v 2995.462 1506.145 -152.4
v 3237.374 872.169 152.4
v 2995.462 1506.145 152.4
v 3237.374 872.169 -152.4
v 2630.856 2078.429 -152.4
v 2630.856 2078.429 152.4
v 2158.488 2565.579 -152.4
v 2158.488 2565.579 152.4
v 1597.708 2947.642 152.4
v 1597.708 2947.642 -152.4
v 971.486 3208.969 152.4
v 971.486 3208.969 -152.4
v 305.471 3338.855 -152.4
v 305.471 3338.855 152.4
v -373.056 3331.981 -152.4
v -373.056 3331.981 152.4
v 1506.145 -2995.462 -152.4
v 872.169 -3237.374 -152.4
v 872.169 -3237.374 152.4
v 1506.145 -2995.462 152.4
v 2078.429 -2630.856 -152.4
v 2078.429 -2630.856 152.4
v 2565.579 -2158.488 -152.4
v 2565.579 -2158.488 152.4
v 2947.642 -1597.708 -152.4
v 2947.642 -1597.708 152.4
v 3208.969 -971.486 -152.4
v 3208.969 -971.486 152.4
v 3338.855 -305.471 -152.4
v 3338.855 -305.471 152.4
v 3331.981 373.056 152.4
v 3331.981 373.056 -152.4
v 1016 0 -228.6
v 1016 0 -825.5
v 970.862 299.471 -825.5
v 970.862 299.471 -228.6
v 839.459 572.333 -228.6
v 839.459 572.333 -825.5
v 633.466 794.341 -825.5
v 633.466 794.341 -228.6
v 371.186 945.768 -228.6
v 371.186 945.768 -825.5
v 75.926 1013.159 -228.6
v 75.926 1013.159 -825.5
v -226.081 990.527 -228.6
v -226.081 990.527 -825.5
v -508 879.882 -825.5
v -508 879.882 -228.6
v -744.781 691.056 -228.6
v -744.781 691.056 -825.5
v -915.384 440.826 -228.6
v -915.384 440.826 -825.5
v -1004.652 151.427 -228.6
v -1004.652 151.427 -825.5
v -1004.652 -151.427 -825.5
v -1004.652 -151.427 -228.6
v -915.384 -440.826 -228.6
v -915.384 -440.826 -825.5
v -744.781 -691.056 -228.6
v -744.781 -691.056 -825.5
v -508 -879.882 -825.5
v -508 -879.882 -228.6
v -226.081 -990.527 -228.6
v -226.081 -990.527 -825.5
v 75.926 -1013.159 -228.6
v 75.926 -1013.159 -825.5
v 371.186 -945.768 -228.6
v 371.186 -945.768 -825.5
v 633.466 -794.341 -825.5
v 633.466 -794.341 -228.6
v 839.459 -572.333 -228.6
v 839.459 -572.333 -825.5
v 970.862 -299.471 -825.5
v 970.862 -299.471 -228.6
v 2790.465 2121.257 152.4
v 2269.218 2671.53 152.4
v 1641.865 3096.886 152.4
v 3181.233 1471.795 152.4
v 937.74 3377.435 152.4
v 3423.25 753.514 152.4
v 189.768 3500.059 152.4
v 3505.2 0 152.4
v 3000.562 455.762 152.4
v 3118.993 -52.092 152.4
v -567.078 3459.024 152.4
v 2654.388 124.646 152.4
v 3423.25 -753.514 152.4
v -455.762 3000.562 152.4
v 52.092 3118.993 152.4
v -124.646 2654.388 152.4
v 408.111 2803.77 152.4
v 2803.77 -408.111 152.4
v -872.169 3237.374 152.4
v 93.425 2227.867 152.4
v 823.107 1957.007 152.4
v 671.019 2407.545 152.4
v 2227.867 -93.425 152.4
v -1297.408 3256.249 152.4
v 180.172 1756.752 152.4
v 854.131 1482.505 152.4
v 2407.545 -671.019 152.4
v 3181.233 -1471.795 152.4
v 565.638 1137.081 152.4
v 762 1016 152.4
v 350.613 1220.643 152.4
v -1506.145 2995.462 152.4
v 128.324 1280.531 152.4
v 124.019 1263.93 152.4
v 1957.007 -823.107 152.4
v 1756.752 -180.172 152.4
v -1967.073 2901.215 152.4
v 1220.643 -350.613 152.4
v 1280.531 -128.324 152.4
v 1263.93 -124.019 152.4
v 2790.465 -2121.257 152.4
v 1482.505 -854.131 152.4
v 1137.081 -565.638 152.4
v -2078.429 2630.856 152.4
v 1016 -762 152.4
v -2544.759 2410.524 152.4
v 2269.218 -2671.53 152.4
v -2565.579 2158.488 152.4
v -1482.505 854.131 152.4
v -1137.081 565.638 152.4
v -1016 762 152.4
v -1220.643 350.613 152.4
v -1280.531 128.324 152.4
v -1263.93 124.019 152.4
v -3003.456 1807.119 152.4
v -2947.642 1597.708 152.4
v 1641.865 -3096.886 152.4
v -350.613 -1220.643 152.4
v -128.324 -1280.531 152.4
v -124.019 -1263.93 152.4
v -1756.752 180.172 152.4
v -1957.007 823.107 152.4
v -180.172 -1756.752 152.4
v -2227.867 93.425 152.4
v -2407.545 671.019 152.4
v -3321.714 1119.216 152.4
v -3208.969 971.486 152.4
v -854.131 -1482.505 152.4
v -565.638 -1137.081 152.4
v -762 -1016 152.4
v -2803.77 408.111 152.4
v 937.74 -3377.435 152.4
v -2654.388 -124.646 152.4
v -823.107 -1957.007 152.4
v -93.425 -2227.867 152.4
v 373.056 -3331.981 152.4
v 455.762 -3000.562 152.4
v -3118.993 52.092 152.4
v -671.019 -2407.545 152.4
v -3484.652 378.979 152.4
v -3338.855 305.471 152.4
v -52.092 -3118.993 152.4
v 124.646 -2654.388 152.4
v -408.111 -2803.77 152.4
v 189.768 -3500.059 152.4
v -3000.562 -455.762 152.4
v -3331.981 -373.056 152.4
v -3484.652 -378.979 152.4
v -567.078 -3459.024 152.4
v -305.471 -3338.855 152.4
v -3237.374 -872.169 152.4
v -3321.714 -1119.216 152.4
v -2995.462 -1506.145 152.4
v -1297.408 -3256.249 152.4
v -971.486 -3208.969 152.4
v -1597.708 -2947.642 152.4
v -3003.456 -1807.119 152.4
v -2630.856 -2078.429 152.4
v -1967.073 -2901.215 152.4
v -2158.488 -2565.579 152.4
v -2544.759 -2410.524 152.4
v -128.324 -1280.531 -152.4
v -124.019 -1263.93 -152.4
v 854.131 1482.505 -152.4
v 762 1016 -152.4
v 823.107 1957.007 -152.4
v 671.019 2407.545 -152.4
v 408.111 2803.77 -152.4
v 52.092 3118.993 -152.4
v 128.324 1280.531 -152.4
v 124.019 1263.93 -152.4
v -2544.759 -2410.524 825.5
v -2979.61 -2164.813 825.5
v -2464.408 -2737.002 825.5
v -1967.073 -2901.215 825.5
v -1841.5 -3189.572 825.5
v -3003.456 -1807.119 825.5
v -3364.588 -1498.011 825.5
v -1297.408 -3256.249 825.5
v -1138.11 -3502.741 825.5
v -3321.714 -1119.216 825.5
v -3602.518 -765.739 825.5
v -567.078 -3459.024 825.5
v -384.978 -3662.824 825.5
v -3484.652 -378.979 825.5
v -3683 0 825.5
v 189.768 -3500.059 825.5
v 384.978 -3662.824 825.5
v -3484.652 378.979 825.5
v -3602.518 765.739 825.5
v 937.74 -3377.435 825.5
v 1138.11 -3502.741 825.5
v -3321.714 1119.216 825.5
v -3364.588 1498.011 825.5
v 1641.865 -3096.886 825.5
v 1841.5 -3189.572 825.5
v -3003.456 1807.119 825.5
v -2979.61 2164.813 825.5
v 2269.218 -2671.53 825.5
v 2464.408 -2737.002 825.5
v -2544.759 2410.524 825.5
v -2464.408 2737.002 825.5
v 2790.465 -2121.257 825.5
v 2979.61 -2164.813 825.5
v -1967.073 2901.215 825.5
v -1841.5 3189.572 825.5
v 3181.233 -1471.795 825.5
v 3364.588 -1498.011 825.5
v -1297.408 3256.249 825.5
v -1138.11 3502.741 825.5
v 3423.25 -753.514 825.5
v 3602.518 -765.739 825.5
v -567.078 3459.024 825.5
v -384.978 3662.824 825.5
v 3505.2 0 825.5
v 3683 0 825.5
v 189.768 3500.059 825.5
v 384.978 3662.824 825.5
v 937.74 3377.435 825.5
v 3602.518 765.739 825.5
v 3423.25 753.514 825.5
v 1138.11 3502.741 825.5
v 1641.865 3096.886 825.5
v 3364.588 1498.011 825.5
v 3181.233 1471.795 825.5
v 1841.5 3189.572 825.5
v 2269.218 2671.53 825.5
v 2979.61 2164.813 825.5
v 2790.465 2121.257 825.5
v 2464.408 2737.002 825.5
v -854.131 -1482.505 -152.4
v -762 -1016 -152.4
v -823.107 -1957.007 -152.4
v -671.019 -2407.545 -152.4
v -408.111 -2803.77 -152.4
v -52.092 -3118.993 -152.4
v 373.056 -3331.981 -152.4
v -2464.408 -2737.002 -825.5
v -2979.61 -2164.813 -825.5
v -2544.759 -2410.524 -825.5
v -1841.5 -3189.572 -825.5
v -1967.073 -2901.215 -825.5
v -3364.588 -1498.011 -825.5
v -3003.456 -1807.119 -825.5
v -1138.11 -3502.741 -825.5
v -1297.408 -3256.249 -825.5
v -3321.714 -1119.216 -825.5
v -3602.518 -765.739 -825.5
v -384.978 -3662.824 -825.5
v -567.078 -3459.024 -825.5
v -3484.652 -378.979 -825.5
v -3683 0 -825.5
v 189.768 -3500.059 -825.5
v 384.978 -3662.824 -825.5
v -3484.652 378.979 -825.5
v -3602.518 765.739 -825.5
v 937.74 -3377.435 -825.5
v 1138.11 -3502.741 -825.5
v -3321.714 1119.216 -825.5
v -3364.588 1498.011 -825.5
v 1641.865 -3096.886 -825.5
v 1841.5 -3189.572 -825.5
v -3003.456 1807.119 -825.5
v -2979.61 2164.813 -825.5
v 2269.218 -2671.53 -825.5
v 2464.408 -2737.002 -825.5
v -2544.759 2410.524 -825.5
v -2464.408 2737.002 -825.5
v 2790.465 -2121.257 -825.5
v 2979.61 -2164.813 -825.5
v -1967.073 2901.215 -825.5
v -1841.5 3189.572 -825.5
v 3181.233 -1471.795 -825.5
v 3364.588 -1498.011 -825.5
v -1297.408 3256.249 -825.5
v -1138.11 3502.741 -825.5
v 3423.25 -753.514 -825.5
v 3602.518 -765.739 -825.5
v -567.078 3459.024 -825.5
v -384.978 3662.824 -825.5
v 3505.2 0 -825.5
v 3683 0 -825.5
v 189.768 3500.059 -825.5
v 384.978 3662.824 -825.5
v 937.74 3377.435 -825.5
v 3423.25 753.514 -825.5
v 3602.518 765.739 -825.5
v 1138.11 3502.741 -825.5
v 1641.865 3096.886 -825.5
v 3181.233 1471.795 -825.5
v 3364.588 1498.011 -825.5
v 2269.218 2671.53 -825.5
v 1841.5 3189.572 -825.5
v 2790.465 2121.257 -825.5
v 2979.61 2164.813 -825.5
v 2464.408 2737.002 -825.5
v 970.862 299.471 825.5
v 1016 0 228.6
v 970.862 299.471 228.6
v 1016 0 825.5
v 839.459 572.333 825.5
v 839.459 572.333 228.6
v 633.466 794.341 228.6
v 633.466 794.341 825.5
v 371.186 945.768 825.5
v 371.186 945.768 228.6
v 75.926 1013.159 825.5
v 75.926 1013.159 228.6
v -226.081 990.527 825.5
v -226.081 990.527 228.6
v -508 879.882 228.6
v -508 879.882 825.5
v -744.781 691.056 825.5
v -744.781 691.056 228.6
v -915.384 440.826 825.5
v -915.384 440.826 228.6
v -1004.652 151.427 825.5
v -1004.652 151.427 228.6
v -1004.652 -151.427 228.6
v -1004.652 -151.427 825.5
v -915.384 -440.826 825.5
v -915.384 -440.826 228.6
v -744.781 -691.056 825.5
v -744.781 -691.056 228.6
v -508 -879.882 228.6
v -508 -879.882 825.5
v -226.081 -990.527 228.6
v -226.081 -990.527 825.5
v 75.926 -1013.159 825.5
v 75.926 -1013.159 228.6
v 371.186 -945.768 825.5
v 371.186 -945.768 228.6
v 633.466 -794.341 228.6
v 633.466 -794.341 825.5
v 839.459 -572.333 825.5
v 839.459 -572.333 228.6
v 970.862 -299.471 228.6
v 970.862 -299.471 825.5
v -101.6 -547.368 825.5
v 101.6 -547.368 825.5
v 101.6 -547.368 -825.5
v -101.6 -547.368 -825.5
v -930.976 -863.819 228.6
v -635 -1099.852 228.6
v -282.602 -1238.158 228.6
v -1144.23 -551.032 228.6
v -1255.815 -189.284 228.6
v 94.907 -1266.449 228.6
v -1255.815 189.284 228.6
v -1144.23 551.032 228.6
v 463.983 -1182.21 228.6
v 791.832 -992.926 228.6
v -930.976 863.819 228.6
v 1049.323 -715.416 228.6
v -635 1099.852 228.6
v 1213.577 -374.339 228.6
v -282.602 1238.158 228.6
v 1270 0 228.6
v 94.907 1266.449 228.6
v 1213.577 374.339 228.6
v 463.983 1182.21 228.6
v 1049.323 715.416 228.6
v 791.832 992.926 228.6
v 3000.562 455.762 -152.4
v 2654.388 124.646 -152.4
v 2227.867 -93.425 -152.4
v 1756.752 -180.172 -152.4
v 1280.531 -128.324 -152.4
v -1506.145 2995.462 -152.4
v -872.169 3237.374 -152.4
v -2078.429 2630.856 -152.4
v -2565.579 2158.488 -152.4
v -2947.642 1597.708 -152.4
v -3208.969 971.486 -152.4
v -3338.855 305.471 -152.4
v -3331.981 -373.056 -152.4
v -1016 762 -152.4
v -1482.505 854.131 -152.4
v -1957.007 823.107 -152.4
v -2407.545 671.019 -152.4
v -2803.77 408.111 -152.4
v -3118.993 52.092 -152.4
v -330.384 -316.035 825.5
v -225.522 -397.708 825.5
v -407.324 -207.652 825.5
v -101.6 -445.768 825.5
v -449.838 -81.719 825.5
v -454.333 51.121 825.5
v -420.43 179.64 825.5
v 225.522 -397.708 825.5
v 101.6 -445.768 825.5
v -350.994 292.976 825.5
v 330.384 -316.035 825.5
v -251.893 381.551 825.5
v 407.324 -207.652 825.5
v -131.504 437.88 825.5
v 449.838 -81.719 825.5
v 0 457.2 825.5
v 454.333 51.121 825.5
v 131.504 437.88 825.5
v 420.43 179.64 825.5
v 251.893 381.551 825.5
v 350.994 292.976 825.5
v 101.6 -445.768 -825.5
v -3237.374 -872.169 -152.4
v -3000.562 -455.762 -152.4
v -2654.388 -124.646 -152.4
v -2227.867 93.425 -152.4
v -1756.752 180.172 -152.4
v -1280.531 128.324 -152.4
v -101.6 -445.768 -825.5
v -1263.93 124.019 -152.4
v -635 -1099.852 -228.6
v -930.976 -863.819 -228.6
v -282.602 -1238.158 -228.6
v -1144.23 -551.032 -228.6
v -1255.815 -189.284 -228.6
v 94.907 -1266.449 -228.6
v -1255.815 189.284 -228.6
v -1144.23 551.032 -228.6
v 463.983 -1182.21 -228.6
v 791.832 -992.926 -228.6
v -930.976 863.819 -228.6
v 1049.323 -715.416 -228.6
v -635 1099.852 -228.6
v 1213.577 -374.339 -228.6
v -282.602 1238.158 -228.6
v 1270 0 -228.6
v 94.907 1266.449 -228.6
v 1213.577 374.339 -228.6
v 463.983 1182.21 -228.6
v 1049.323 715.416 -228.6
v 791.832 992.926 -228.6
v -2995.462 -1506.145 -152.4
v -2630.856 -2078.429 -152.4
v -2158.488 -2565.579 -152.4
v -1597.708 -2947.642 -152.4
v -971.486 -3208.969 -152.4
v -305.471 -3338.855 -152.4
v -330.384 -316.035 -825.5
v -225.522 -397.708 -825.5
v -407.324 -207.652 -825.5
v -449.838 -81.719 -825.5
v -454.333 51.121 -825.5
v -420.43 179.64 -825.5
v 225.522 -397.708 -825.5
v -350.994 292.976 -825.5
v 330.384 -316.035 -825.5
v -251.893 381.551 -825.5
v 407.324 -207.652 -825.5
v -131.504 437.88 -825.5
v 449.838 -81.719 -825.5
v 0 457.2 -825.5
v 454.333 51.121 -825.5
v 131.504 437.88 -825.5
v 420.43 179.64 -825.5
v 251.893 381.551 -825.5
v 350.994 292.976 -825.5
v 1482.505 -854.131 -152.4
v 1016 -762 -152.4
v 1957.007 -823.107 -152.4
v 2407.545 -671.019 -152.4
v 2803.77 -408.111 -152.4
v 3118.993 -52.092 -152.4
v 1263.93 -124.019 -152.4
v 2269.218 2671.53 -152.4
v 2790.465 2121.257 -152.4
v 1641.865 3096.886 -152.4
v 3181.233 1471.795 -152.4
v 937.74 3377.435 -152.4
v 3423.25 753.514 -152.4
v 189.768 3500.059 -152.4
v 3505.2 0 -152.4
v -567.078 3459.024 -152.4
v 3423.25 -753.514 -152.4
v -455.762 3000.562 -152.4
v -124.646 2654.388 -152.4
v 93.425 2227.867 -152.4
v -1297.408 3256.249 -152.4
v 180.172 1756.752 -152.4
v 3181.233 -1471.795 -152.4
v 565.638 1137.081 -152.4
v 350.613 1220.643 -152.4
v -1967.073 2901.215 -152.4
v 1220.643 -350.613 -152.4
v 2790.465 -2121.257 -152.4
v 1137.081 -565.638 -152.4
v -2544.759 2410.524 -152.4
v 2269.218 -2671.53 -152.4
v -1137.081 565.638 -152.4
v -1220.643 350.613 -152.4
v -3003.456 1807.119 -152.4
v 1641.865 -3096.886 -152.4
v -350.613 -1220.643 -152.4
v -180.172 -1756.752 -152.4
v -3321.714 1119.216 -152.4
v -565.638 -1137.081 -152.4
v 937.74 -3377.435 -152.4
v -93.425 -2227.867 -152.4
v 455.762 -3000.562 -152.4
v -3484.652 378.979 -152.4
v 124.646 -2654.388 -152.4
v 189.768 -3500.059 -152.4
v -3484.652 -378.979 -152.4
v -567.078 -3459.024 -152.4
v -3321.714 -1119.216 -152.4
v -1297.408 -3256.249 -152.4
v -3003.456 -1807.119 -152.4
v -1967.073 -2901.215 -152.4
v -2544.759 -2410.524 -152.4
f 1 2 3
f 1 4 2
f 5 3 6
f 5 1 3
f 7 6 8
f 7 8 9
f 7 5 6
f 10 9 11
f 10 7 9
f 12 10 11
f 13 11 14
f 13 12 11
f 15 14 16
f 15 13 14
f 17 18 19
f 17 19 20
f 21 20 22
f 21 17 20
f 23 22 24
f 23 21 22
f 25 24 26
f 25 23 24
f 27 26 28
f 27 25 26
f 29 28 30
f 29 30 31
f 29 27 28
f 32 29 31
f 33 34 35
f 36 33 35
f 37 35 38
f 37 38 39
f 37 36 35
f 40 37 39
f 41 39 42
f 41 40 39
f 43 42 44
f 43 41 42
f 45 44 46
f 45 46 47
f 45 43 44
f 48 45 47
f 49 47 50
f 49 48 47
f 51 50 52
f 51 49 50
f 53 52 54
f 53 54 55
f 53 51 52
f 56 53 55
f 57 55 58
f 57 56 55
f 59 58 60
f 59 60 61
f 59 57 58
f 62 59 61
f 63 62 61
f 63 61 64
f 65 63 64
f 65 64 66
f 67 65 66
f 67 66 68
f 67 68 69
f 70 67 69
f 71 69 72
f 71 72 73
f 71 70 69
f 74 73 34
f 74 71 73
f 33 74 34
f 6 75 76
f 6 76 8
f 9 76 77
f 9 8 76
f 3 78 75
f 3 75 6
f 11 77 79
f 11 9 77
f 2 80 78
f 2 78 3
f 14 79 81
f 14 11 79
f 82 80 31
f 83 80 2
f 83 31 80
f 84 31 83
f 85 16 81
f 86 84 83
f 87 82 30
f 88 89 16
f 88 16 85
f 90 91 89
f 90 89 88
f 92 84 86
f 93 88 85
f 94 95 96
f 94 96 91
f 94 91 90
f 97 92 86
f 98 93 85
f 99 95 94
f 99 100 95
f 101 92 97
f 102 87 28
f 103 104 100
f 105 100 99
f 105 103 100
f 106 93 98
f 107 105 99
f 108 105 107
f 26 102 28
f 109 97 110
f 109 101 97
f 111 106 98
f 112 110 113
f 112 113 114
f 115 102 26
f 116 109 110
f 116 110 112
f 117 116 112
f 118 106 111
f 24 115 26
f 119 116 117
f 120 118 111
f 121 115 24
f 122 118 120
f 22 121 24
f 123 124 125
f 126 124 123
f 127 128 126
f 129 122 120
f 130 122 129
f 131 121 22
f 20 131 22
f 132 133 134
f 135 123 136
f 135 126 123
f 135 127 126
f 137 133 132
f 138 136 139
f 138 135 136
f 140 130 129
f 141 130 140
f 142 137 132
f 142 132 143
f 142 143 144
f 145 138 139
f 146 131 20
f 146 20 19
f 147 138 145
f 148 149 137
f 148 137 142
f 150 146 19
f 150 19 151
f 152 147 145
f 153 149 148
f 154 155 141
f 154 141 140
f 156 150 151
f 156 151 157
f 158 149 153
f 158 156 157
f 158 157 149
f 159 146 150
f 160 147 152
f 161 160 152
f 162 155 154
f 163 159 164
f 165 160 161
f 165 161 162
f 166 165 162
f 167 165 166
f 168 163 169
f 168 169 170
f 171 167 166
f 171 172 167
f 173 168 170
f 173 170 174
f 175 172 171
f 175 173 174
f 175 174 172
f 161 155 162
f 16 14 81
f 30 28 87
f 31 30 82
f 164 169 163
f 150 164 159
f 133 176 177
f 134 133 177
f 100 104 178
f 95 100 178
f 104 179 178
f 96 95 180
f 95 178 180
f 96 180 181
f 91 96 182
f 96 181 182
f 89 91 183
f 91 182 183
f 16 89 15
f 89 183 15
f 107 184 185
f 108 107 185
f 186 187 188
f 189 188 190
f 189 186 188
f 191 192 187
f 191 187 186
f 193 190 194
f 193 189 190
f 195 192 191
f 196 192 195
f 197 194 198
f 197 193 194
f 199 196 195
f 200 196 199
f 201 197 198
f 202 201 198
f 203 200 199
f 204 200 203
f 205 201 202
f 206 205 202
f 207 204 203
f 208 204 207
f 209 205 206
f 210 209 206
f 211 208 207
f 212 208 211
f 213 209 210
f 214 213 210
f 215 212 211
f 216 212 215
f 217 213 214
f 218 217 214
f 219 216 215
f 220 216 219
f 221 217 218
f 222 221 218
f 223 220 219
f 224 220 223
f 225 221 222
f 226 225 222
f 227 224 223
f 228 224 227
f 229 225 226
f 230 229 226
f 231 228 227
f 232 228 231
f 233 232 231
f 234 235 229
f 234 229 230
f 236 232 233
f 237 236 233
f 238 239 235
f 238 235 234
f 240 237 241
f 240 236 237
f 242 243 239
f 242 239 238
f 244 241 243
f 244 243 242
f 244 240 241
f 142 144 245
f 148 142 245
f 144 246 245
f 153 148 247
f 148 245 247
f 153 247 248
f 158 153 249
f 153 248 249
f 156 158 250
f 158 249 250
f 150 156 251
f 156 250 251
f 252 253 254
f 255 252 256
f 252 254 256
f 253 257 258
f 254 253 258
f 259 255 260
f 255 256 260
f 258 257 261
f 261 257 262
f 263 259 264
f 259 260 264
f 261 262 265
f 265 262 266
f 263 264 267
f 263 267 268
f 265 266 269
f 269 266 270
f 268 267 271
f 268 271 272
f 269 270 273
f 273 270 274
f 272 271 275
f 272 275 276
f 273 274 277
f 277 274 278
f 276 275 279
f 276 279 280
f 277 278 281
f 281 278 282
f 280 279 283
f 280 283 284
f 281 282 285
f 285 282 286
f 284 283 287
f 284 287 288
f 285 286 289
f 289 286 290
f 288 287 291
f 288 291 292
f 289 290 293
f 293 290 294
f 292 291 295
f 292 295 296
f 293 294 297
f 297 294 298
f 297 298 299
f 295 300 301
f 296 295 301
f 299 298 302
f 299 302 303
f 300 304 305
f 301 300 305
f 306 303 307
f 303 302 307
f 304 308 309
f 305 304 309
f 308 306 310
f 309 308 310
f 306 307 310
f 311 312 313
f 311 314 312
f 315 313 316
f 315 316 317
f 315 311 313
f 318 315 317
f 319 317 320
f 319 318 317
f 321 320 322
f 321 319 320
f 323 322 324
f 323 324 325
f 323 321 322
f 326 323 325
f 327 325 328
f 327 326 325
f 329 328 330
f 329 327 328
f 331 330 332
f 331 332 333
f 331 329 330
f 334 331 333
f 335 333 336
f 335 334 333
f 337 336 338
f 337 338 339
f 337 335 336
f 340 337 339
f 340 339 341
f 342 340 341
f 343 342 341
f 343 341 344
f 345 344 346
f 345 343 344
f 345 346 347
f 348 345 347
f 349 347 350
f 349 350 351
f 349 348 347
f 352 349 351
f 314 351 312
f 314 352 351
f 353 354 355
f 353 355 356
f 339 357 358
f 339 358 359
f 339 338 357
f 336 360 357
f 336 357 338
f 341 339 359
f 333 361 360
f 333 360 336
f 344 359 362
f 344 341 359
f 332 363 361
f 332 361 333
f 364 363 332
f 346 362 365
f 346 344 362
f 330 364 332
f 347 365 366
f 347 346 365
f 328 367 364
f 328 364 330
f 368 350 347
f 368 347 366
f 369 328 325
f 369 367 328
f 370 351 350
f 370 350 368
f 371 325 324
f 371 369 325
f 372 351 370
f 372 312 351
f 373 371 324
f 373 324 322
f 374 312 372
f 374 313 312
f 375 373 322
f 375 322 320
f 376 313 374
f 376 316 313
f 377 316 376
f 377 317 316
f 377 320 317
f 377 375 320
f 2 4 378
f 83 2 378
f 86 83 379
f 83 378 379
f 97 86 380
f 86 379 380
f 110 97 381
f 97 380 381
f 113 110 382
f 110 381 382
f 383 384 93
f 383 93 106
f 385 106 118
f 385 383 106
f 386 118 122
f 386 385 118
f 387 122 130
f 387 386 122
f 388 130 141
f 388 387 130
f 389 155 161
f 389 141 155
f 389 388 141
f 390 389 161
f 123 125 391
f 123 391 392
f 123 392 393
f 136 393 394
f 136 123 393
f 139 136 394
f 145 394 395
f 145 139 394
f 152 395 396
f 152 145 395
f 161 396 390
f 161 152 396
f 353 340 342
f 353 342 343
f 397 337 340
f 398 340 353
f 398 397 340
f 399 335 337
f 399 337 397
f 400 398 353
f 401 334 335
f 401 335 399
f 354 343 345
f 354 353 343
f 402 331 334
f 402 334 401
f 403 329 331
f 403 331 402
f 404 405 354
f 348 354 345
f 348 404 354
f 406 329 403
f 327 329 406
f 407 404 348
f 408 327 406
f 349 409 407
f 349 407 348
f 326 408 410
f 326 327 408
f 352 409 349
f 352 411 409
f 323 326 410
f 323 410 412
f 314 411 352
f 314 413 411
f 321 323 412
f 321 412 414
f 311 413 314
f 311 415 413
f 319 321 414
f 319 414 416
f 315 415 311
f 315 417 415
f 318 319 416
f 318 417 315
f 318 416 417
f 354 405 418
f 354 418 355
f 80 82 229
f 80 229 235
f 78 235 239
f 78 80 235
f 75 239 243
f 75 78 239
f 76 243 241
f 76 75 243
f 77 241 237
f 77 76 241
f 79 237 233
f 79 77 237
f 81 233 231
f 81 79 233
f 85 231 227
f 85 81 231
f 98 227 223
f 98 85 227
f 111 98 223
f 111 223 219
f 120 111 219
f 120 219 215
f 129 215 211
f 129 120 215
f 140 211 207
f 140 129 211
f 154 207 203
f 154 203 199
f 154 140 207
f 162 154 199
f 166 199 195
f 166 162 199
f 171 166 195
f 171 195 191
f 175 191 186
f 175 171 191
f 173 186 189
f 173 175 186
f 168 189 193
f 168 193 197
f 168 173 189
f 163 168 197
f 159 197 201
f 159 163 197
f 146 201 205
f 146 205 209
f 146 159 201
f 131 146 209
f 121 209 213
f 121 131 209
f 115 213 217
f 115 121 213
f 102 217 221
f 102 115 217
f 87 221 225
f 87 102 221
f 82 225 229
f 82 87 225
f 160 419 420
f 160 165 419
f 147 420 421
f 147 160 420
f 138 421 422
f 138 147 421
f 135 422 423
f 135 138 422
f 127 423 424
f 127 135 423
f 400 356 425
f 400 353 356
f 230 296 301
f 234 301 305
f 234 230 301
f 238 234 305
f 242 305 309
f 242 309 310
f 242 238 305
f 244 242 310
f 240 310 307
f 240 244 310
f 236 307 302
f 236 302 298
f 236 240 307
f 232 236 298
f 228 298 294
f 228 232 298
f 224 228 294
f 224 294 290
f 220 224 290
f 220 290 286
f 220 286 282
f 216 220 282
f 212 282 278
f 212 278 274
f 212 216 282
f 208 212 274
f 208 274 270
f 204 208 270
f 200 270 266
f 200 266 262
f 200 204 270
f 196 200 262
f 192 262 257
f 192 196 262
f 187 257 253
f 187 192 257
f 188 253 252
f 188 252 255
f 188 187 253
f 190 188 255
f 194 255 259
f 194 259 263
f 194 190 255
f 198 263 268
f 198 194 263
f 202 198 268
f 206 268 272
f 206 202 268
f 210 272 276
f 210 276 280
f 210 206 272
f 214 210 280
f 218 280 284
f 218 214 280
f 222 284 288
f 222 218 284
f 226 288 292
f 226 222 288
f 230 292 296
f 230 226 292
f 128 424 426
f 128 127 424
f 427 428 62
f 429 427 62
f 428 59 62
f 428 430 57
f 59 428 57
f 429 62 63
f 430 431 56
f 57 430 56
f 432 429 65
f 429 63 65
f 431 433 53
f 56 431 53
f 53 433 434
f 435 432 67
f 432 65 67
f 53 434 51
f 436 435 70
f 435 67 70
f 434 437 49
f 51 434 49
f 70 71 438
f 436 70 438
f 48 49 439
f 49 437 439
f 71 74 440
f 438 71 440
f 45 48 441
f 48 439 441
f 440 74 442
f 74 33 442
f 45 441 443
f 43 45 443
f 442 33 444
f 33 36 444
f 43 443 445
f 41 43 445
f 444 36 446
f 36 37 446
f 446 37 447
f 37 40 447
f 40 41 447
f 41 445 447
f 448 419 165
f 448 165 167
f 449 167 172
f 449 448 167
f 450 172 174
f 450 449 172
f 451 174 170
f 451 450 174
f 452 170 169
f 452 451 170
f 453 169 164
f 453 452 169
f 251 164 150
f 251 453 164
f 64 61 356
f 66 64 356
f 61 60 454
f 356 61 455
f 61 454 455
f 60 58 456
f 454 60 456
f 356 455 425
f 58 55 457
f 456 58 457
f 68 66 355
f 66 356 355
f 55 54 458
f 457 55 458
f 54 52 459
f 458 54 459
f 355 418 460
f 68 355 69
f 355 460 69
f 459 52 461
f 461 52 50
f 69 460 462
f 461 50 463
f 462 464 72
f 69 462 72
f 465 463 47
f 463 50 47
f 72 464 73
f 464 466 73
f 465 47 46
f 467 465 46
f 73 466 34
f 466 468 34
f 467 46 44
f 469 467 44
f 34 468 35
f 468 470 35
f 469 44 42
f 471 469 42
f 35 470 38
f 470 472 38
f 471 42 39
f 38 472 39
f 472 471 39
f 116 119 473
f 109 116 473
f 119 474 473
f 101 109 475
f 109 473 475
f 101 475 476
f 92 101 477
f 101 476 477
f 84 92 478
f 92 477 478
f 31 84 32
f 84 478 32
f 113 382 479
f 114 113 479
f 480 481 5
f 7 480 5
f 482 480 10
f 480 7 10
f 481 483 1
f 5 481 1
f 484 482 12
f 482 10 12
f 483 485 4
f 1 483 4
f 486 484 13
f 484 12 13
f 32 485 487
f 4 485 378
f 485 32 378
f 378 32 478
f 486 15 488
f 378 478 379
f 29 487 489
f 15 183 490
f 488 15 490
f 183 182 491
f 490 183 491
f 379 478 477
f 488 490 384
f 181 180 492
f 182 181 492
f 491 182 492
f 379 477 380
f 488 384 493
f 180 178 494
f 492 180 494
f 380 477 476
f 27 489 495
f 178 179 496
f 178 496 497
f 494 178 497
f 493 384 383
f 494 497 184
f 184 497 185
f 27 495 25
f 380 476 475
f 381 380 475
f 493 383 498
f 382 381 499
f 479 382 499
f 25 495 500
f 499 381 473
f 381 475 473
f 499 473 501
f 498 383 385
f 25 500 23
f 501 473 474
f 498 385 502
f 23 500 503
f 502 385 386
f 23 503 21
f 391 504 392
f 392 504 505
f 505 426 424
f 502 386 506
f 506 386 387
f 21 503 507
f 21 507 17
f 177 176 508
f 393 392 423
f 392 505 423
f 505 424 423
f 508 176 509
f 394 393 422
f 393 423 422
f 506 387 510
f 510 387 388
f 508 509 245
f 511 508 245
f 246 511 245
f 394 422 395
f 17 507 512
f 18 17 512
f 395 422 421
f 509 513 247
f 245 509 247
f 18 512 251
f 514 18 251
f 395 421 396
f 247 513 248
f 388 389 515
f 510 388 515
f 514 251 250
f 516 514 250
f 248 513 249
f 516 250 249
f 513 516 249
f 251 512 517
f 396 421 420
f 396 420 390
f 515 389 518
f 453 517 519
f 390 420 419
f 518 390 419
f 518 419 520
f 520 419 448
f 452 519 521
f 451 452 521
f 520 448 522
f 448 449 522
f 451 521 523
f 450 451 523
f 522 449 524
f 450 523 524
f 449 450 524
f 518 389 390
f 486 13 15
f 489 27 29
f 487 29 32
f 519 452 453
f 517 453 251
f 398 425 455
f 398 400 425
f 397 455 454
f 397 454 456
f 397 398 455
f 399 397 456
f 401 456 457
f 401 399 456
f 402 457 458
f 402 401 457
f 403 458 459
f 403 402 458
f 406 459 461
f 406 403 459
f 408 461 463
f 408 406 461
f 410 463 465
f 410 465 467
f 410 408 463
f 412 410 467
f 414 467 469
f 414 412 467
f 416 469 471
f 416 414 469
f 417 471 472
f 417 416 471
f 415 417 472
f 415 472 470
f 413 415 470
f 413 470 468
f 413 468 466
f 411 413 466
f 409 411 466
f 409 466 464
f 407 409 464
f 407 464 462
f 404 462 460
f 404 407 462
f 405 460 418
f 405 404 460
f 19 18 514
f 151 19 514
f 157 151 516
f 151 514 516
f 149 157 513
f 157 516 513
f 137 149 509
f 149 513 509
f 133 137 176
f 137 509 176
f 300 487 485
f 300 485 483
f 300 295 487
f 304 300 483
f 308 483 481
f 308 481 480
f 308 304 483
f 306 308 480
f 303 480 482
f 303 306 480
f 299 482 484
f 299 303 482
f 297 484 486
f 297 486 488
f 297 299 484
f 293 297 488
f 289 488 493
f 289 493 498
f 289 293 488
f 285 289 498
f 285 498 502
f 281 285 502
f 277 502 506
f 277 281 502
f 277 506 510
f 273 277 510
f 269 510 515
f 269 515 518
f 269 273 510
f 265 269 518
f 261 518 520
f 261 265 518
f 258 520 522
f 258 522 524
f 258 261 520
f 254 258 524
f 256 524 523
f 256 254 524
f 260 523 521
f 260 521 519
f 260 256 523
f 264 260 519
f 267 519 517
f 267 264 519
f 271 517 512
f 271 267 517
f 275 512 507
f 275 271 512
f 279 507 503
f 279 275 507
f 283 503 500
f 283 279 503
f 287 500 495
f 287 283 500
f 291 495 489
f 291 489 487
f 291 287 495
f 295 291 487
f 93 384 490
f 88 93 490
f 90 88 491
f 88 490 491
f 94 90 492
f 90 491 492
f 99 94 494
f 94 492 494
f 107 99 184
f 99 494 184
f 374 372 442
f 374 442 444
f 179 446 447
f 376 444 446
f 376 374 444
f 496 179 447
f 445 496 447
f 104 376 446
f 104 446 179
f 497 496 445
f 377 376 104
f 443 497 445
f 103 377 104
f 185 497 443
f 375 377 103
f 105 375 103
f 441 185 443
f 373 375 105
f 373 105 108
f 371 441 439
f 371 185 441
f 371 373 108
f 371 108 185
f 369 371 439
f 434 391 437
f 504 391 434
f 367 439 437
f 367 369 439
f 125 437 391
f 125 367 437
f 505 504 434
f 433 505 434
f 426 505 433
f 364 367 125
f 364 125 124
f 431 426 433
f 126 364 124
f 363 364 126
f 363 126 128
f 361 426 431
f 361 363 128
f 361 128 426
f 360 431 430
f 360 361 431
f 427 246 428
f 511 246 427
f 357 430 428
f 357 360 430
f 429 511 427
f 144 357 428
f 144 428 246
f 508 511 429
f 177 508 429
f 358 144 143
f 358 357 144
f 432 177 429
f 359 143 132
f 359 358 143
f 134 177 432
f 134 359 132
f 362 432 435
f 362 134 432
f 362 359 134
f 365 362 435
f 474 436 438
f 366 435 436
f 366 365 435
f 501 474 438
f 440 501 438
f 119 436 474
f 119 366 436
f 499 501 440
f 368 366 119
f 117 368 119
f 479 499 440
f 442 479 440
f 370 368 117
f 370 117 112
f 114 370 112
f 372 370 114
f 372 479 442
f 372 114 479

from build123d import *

# Parameters (mm, degrees)
SKETCH4_R            = 1270
BOSS_EXTRUDE2_DEPTH  = 228.6
SKETCH5_R            = 1016
BOSS_EXTRUDE3_DEPTH  = 825.5
CUT_EXTRUDE2_DEPTH   = 825.5
SKETCH7_R            = 3505.2
SKETCH7_R_2          = 3352.8
BOSS_EXTRUDE5_DEPTH  = 152.4
SKETCH9_R            = 3683
SKETCH9_R_2          = 3505.2
BOSS_EXTRUDE8_DEPTH  = 825.5
BOSS_EXTRUDE10_DEPTH = 152.4


with BuildPart() as part:
    # Sketch4 → Boss-Extrude2 (new, symmetric)
    with BuildSketch(Plane.XY):
        Circle(SKETCH4_R)
    extrude(amount=BOSS_EXTRUDE2_DEPTH, both=True)

    # Sketch5 → Boss-Extrude3 (add, symmetric)
    with BuildSketch(Plane.XY):
        Circle(SKETCH5_R)
    extrude(amount=BOSS_EXTRUDE3_DEPTH, both=True)

    # Sketch6 → Cut-Extrude2 (cut, symmetric)
    with BuildSketch(Plane.XY):
        with BuildLine():
            Line((101.6, -547.36819088), (-101.6, -547.36819088))
            Line((-101.6, -547.36819088), (-101.6, -445.76819088))
            ThreePointArc((-101.6, -445.76819088), (0, 457.2), (101.6, -445.76819088))
            Line((101.6, -445.76819088), (101.6, -547.36819088))
        make_face()
    extrude(amount=CUT_EXTRUDE2_DEPTH, both=True, mode=Mode.SUBTRACT)



with BuildPart() as body_2:
    # Sketch7 → Boss-Extrude5 (new, symmetric)
    with BuildSketch(Plane.XY):
        with Locations(Location((0, 0, 0), (0, 0, 180))):
            Circle(SKETCH7_R)
        with Locations(Location((0, 0, 0), (0, 0, 180))):
            Circle(SKETCH7_R_2, mode=Mode.SUBTRACT)
    extrude(amount=BOSS_EXTRUDE5_DEPTH, both=True)

    # Sketch9 → Boss-Extrude8 (add, symmetric)
    with BuildSketch(Plane.XY):
        Circle(SKETCH9_R)
        Circle(SKETCH9_R_2, mode=Mode.SUBTRACT)
    extrude(amount=BOSS_EXTRUDE8_DEPTH, both=True)


with BuildPart() as part_1:
    add(part.part)

    add(body_2.part)  # Boss-Extrude10 merges body 2
    # Sketch10 → Boss-Extrude10 (add, symmetric)
    with BuildSketch(Plane.XY):
        with BuildLine():
            Line((128.323732845, 1280.530953966), (124.019045377, 1263.930091573))
            ThreePointArc((124.019045377, 1263.930091573), (460.026922875, 1183.754717089), (762, 1016))
            ThreePointArc((762, 1016), (671.019226754, 2407.545178719), (-373.05648294, 3331.980897385))
            ThreePointArc((-373.05648294, 3331.980897385), (-624.407212979, 3294.143814769), (-872.169182147, 3237.373743903))
            ThreePointArc((-872.169182147, 3237.373743903), (-0.09284249, 2449.061214398), (128.323732845, 1280.530953966))
        make_face()
        with BuildLine():
            Line((1280.530953966, -128.323732845), (1263.930091573, -124.019045377))
            ThreePointArc((1263.930091573, -124.019045377), (1183.754717089, -460.026922875), (1016, -762))
            ThreePointArc((1016, -762), (2407.545178719, -671.019226754), (3331.980897385, 373.05648294))
            ThreePointArc((3331.980897385, 373.05648294), (3294.143814769, 624.407212979), (3237.373743903, 872.169182147))
            ThreePointArc((3237.373743903, 872.169182147), (2449.061214398, 0.09284249), (1280.530953966, -128.323732845))
        make_face()
        with BuildLine():
            Line((-128.323732845, -1280.530953966), (-124.019045377, -1263.930091573))
            ThreePointArc((-124.019045377, -1263.930091573), (-460.026922875, -1183.754717089), (-762, -1016))
            ThreePointArc((-762, -1016), (-671.019226754, -2407.545178719), (373.05648294, -3331.980897385))
            ThreePointArc((373.05648294, -3331.980897385), (624.407212979, -3294.143814769), (872.169182147, -3237.373743903))
            ThreePointArc((872.169182147, -3237.373743903), (0.09284249, -2449.061214398), (-128.323732845, -1280.530953966))
        make_face()
        with BuildLine():
            Line((-1280.530953966, 128.323732845), (-1263.930091573, 124.019045377))
            ThreePointArc((-1263.930091573, 124.019045377), (-1183.754717089, 460.026922875), (-1016, 762))
            ThreePointArc((-1016, 762), (-2407.545178719, 671.019226754), (-3331.980897385, -373.05648294))
            ThreePointArc((-3331.980897385, -373.05648294), (-3294.143814769, -624.407212979), (-3237.373743903, -872.169182147))
            ThreePointArc((-3237.373743903, -872.169182147), (-2449.061214398, -0.09284249), (-1280.530953966, 128.323732845))
        make_face()
    extrude(amount=BOSS_EXTRUDE10_DEPTH, both=True)


solid = part_1.part
